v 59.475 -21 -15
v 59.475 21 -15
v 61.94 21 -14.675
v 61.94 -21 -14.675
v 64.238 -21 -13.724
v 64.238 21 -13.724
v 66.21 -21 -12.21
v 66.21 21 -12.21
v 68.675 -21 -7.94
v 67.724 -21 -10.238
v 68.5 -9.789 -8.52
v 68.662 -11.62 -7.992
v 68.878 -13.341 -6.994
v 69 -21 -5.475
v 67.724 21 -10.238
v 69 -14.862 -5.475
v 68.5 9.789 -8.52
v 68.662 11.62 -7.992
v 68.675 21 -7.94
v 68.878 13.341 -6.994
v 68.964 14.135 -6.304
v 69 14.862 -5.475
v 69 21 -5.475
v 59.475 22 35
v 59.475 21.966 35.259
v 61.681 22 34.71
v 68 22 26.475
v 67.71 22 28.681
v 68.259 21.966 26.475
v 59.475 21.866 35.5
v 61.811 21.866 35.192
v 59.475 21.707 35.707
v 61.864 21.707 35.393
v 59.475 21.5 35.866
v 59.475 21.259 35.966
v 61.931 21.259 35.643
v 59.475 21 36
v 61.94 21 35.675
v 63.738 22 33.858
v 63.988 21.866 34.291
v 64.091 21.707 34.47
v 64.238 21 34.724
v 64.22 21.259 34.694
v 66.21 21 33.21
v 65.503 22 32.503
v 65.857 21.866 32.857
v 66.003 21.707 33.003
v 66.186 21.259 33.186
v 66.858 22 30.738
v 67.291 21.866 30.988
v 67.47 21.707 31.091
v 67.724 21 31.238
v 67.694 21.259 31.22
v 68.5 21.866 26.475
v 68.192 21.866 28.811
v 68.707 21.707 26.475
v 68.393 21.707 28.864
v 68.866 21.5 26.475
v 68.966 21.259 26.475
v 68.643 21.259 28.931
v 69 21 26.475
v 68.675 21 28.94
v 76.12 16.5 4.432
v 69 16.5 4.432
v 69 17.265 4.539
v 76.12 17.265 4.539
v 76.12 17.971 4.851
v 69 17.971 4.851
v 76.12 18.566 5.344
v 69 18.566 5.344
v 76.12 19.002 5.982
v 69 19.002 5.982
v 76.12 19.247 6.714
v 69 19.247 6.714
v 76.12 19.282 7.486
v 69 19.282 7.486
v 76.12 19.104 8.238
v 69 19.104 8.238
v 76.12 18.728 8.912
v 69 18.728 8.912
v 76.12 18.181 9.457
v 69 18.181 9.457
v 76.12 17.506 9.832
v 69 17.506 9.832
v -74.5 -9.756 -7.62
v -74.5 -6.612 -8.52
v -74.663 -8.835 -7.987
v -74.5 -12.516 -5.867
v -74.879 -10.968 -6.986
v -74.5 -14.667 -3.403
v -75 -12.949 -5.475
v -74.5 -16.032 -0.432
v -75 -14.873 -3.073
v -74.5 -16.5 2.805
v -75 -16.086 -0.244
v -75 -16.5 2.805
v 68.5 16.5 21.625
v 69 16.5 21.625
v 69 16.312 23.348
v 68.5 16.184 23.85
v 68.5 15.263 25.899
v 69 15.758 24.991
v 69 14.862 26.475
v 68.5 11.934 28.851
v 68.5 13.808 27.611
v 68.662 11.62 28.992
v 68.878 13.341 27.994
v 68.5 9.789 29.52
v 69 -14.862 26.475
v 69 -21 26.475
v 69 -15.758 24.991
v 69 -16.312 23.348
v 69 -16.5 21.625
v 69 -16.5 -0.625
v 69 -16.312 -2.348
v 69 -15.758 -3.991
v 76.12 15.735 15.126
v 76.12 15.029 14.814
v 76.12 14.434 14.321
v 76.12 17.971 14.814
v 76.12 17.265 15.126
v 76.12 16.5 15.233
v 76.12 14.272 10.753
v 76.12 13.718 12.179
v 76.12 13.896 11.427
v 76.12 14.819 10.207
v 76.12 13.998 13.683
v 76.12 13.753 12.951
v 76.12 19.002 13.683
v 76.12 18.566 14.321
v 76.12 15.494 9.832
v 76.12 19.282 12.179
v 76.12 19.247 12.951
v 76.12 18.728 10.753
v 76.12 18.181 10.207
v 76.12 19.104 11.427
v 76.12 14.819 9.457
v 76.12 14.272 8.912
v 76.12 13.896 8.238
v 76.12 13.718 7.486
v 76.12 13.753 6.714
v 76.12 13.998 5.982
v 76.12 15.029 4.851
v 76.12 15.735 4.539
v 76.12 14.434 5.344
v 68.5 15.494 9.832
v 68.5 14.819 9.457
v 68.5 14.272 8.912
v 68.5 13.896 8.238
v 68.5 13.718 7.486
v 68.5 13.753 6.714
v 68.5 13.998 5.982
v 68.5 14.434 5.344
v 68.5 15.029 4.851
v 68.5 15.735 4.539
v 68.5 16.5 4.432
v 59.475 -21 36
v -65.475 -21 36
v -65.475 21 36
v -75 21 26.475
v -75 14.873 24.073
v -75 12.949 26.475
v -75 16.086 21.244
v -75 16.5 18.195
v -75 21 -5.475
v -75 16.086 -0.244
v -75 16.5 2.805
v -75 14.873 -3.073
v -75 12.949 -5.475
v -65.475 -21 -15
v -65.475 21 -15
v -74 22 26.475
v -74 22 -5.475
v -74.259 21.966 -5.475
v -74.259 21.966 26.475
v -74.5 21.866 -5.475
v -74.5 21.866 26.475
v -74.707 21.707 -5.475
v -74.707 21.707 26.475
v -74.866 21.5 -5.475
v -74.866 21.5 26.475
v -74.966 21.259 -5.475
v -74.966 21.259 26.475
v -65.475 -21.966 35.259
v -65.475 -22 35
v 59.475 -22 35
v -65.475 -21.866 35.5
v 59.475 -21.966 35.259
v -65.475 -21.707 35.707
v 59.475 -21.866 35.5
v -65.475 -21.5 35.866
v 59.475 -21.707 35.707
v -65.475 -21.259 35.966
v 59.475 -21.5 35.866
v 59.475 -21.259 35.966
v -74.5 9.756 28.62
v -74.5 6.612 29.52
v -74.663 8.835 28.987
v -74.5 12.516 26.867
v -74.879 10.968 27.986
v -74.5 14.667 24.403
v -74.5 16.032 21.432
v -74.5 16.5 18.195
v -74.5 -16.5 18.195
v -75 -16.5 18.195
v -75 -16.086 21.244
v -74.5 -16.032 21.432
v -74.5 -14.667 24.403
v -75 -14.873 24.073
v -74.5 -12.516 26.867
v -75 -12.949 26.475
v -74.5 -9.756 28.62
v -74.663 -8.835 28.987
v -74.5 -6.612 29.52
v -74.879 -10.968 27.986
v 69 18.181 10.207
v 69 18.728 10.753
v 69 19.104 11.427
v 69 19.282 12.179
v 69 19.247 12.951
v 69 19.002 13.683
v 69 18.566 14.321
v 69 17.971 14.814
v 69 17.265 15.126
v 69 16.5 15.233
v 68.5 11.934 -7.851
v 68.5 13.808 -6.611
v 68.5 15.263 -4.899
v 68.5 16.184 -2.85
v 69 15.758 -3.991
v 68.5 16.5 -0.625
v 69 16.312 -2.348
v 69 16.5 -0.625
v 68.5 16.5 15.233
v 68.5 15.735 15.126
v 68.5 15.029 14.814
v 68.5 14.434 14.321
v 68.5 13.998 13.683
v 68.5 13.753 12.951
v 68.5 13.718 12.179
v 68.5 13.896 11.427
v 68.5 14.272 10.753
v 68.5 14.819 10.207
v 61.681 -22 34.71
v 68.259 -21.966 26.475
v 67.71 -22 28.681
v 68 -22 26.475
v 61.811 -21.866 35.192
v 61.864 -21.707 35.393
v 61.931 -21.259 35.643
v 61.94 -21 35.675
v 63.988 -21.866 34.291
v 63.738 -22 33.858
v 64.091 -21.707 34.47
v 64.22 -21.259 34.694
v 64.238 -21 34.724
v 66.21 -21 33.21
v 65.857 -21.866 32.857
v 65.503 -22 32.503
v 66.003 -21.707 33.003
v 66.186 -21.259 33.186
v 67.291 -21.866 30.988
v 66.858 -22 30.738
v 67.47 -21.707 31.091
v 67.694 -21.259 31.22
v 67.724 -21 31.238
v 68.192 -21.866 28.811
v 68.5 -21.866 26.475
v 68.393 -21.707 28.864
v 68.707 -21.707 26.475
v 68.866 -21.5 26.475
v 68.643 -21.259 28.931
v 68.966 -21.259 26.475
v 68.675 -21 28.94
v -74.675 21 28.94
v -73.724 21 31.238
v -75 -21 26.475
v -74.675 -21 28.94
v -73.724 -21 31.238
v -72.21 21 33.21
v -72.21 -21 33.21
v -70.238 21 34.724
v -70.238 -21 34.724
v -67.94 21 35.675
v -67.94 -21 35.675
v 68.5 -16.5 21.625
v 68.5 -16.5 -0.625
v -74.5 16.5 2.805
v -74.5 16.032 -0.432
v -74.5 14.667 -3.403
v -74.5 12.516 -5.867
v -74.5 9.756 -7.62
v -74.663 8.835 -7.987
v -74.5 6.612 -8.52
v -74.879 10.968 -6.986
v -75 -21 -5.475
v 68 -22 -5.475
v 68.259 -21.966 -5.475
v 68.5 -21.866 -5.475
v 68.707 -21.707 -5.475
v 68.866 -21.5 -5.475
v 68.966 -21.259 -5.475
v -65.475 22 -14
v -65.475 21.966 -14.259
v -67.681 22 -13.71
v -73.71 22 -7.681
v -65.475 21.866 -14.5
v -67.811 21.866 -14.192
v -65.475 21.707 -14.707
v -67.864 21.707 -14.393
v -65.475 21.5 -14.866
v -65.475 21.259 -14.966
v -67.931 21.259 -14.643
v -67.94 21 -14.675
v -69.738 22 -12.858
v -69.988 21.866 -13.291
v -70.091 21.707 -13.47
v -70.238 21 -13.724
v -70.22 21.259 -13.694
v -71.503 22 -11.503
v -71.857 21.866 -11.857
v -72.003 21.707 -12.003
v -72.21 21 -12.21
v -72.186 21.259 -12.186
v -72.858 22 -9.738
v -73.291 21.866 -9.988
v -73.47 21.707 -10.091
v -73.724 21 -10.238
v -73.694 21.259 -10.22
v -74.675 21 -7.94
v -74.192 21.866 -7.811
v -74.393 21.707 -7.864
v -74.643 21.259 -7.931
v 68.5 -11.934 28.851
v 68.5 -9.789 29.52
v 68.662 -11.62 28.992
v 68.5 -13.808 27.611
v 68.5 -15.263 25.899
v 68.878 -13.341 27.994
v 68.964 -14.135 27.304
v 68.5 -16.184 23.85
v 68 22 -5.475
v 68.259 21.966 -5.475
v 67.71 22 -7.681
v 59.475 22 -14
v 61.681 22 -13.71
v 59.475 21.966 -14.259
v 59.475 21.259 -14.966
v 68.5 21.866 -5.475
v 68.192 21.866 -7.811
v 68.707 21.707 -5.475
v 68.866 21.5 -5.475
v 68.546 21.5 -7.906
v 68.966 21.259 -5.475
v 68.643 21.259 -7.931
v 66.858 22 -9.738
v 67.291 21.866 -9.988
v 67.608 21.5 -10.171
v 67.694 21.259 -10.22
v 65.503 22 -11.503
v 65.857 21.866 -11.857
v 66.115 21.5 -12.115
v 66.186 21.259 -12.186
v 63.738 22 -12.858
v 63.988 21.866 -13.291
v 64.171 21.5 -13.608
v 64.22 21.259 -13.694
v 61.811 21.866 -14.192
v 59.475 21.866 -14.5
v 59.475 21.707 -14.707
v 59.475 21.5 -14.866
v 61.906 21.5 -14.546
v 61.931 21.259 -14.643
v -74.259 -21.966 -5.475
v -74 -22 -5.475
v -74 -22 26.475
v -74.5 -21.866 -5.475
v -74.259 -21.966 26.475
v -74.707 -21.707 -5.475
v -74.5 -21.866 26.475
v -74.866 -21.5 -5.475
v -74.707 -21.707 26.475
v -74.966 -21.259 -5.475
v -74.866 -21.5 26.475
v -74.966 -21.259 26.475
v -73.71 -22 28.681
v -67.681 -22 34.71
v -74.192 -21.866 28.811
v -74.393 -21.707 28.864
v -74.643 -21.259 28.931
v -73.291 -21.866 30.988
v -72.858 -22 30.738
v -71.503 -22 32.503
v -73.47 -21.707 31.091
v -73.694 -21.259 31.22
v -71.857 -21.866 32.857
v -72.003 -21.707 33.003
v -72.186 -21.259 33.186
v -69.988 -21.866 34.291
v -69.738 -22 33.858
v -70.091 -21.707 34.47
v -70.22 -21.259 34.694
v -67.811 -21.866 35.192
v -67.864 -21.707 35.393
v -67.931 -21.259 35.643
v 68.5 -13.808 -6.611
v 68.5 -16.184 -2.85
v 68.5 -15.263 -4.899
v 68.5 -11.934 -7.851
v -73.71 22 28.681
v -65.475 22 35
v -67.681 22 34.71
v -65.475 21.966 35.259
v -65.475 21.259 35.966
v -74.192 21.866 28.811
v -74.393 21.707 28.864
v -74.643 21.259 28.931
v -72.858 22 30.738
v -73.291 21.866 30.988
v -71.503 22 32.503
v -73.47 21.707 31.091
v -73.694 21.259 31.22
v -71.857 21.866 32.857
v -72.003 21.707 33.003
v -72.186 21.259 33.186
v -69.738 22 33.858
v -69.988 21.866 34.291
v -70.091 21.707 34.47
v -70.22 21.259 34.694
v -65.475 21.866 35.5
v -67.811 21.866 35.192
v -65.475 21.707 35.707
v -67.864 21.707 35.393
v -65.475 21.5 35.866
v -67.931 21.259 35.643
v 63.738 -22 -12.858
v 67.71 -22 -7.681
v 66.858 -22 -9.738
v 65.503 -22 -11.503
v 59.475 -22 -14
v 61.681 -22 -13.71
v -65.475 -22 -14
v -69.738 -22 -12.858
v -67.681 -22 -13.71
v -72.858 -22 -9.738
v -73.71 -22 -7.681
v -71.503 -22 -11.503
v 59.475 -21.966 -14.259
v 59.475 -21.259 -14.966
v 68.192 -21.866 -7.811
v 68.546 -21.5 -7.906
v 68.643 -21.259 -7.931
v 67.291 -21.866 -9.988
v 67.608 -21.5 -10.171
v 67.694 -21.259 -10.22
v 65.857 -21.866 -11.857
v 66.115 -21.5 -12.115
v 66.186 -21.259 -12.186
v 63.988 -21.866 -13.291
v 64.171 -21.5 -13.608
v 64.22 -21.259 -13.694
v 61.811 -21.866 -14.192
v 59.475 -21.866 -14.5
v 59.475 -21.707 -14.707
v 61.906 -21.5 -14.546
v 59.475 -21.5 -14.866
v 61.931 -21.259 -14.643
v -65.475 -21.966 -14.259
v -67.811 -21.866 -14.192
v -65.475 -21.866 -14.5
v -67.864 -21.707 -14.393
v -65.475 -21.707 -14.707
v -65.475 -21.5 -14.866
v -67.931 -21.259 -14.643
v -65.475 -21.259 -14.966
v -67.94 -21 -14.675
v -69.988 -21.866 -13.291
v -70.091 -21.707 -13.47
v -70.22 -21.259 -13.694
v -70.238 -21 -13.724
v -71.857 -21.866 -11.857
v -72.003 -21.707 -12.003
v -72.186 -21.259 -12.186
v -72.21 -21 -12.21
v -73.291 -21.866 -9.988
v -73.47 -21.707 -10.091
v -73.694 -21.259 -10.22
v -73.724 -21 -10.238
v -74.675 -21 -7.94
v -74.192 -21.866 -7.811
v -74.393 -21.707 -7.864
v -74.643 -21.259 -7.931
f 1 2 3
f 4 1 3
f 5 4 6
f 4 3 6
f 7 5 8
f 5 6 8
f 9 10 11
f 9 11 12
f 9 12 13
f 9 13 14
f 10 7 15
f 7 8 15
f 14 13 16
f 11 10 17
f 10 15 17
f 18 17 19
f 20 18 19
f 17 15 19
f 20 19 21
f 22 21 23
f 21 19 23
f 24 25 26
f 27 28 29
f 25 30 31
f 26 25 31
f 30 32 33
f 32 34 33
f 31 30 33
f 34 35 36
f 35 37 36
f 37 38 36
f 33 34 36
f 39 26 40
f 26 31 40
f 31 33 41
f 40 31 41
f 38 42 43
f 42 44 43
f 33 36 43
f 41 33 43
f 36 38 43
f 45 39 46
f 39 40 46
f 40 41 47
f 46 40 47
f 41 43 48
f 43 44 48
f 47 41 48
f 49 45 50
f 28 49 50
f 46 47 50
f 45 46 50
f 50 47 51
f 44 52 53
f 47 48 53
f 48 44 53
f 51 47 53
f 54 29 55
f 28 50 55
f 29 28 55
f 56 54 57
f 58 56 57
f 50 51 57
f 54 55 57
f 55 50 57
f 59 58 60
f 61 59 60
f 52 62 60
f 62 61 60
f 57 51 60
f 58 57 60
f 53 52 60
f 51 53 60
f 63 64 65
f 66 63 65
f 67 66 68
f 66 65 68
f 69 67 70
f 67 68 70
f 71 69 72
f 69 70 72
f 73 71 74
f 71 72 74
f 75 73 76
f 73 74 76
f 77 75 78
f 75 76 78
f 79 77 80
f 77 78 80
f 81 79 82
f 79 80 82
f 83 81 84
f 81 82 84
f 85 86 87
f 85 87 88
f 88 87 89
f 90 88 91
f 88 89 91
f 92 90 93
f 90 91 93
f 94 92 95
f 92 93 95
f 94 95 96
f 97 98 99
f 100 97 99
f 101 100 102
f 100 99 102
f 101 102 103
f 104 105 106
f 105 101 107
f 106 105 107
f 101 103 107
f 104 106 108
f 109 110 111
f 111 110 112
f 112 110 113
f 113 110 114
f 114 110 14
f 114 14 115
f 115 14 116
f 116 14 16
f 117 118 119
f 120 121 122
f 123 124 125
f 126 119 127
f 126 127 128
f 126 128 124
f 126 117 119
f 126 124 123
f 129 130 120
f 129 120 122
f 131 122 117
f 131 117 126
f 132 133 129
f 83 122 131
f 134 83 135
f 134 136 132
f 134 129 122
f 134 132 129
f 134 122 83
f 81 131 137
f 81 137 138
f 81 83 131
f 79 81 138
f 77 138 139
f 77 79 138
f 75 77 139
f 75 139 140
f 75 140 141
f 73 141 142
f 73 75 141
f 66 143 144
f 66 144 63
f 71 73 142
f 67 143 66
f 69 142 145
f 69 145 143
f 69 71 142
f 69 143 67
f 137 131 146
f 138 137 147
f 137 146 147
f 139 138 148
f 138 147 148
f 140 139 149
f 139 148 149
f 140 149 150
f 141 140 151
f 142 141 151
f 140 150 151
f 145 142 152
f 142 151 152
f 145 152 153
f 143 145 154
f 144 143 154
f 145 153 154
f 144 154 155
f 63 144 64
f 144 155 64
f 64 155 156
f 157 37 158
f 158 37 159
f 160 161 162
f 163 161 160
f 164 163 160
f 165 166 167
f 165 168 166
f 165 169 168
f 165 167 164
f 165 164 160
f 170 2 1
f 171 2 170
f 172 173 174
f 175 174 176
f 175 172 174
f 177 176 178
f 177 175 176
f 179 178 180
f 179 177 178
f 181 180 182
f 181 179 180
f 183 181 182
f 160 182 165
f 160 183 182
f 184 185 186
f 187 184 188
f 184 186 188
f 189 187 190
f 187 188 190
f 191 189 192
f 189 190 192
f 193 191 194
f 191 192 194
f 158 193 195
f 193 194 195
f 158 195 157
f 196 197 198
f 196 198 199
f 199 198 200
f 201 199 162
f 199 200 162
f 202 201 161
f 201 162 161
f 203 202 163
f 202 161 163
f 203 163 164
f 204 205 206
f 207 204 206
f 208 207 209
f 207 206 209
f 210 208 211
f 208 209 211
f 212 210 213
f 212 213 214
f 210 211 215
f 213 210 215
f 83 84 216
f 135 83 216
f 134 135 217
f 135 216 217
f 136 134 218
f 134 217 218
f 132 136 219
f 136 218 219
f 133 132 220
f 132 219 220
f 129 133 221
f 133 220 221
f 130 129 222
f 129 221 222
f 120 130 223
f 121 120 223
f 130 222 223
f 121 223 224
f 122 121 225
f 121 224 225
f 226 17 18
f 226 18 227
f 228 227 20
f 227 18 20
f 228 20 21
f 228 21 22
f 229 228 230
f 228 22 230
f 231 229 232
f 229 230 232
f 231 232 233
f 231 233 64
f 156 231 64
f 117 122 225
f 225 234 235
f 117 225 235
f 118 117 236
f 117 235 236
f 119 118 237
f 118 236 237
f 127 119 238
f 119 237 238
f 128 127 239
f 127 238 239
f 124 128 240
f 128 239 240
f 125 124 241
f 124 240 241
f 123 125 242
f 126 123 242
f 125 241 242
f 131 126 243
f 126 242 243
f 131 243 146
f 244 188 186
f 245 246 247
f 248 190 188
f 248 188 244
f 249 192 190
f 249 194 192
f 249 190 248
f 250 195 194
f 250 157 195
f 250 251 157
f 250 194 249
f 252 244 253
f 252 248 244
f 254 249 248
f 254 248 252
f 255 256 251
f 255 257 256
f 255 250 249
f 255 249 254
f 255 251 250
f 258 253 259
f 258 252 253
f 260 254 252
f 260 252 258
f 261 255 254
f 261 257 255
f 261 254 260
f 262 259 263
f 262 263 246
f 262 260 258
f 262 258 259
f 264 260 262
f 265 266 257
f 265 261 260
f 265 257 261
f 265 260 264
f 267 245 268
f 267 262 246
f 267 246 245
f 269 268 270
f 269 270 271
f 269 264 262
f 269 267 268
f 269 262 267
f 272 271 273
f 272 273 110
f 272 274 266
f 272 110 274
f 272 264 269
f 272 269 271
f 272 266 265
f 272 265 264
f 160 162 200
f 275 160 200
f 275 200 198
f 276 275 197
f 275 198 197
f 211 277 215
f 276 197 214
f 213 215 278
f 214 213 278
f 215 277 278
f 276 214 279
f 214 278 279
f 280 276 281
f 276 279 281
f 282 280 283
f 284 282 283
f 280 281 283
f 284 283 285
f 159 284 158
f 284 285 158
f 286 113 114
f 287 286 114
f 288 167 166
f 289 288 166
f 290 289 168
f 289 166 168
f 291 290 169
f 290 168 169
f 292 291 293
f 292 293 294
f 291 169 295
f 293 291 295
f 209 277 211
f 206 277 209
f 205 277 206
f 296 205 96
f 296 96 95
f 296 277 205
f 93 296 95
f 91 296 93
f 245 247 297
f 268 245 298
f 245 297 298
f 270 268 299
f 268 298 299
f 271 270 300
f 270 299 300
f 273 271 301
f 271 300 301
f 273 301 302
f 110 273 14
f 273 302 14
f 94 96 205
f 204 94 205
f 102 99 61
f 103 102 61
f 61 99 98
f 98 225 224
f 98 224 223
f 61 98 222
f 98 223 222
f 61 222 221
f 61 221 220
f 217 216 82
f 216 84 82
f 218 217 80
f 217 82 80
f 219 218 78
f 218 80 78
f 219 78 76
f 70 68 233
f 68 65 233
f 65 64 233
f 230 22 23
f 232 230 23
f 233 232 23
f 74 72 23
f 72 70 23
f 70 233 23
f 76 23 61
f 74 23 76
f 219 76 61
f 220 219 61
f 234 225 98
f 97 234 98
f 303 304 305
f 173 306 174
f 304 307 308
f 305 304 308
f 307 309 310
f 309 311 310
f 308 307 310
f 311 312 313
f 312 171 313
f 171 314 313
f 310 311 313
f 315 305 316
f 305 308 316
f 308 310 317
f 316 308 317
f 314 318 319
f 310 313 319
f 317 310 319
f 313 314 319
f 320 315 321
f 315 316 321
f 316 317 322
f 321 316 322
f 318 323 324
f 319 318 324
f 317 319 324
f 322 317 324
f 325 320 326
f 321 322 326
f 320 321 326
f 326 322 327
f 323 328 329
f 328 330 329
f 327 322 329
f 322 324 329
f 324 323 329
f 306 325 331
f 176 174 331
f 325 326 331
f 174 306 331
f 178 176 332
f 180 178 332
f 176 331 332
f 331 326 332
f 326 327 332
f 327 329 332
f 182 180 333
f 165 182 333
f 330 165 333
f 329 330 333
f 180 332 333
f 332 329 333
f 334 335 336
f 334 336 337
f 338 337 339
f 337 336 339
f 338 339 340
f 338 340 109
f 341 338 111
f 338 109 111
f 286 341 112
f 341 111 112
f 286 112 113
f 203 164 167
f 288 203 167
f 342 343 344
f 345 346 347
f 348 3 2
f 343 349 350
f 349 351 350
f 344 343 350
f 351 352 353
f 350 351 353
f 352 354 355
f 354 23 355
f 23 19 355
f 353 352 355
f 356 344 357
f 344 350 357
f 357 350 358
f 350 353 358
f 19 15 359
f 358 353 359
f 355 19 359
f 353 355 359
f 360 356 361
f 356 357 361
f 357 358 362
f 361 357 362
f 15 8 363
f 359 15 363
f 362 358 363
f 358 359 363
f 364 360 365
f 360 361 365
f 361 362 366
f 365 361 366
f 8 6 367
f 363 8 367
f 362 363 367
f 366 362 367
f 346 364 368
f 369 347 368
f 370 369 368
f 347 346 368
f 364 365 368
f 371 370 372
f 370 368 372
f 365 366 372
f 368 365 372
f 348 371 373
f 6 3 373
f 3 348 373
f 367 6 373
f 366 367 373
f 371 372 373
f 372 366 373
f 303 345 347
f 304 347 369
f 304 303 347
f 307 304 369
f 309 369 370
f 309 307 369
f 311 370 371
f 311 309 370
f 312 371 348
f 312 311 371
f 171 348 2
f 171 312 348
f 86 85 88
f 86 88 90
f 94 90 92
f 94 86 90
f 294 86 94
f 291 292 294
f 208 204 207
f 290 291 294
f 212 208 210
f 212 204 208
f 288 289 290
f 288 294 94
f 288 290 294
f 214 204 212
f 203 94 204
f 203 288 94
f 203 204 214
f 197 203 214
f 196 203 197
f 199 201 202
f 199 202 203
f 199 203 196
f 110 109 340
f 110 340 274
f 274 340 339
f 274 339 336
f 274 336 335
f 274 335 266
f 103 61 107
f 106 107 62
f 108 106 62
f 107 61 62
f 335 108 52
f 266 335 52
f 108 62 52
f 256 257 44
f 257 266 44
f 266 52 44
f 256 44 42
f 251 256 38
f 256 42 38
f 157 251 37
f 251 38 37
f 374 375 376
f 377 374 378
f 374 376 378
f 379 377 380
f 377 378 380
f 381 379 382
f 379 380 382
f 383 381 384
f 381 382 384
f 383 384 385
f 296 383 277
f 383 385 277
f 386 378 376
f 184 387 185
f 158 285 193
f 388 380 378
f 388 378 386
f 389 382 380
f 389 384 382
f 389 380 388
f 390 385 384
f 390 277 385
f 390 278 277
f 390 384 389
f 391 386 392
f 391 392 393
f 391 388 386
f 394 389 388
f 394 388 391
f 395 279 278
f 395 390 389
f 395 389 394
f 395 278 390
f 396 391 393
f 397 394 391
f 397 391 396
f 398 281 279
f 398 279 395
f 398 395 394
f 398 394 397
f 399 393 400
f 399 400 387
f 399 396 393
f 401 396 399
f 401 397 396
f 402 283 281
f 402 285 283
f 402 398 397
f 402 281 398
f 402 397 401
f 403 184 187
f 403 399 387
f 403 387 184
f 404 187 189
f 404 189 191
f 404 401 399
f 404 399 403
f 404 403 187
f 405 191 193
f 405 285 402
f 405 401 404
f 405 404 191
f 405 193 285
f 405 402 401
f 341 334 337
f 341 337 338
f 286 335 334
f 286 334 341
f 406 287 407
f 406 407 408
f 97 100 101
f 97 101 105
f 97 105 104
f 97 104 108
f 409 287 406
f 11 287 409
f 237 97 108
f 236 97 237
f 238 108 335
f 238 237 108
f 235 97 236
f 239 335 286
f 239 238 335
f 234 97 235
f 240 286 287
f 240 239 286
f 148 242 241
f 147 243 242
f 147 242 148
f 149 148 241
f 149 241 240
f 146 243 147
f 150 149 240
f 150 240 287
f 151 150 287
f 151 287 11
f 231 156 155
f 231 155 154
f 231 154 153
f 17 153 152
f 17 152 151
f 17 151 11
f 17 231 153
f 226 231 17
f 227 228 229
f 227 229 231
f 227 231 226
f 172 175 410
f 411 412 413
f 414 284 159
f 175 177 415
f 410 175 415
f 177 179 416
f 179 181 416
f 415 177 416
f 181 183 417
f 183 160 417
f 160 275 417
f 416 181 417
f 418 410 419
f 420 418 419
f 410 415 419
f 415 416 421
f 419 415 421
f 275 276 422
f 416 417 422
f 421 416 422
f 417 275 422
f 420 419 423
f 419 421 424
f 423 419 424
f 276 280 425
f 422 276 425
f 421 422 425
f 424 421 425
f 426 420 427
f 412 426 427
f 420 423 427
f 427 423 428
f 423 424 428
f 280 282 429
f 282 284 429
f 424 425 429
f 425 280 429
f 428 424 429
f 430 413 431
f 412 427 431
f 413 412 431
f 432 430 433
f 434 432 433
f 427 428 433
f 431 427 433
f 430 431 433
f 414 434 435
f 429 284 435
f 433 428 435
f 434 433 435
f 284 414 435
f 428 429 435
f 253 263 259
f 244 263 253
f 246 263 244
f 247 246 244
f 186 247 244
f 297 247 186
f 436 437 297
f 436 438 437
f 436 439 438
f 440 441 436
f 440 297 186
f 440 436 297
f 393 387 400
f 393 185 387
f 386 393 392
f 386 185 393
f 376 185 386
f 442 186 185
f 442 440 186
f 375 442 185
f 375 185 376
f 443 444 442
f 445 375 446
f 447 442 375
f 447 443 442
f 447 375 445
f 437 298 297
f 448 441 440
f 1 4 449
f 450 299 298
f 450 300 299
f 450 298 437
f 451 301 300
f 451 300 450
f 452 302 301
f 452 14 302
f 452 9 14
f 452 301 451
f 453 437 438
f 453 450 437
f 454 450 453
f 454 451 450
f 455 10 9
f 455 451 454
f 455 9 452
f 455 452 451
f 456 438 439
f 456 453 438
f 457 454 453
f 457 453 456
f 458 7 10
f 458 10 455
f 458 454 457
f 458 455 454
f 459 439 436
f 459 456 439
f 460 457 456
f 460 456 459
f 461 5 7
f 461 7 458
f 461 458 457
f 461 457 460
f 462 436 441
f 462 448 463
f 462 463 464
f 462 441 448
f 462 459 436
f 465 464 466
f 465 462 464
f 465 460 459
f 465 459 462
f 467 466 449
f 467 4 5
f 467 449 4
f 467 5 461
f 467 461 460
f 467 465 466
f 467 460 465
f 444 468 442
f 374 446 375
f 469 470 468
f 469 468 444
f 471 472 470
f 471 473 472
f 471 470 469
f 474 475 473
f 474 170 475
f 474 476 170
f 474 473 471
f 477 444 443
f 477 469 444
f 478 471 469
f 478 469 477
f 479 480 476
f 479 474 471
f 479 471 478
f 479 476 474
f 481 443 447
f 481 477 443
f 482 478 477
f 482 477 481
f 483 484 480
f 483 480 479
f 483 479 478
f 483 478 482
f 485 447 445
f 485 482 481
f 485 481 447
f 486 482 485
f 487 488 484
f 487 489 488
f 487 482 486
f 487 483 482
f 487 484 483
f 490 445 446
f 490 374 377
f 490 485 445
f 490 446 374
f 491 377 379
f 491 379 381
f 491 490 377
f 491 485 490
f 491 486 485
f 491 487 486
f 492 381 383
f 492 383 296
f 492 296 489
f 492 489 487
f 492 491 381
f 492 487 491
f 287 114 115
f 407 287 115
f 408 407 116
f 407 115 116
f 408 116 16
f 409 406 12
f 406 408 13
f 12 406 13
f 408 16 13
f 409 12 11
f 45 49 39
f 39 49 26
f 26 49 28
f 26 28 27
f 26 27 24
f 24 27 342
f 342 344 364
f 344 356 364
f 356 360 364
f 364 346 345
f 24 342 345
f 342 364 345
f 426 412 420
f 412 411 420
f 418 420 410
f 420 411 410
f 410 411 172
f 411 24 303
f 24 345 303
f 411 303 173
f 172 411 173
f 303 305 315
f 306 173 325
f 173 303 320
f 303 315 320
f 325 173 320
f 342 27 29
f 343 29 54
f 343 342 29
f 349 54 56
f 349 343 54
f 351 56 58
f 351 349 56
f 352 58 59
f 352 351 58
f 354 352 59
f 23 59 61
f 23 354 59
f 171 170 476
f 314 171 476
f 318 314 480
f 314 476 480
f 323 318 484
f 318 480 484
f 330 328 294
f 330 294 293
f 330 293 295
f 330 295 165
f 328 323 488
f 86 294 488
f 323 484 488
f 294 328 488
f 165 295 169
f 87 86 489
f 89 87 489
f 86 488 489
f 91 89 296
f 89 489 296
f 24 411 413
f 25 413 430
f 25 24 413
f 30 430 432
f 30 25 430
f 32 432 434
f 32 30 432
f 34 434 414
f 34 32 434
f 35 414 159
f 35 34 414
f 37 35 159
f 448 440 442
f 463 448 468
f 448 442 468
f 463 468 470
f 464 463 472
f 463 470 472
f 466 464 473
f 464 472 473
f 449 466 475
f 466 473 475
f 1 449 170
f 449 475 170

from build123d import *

# Parameters (mm, degrees)
SKETCH1_W                = 144
SKETCH1_H                = 44
BOSS_EXTRUDE1_DEPTH      = 51
CUT_EXTRUDE1_DEPTH       = 0.5
CUT_EXTRUDE2_DEPTH       = 0.5
FILLET1_R                = 9.525
FILLET2_R                = 1
BOSS_EXTRUDE2_DEPTH      = 7.62
BOSS_EXTRUDE2_DEPTH_BACK = 2.54


with BuildPart() as part:
    # Sketch1 → Boss-Extrude1 (new body)
    with BuildSketch(Plane(origin=(0, 0, -15), x_dir=(-1, 0, 0), z_dir=(0, 0, -1))):
        with Locations((3, 0)):
            Rectangle(SKETCH1_W, SKETCH1_H)
    extrude(amount=-BOSS_EXTRUDE1_DEPTH)

    # Sketch2 → Cut-Extrude1 (cut)
    with BuildSketch(Plane(origin=(69, 0, 0), x_dir=(0, 0, -1), z_dir=(1, 0, 0))):
        with BuildLine():
            Line((-29.625, 8.5), (-29.625, -8.5))
            ThreePointArc((-29.625, -8.5), (-27.281854249, -14.156854249), (-21.625, -16.5))
            Line((-21.625, -16.5), (0.625, -16.5))
            ThreePointArc((0.625, -16.5), (6.281854249, -14.156854249), (8.625, -8.5))
            Line((8.625, -8.5), (8.625, 8.5))
            ThreePointArc((8.625, 8.5), (6.281854249, 14.156854249), (0.625, 16.5))
            Line((0.625, 16.5), (-21.625, 16.5))
            ThreePointArc((-21.625, 16.5), (-27.281854249, 14.156854249), (-29.625, 8.5))
        make_face()
    extrude(amount=-CUT_EXTRUDE1_DEPTH, mode=Mode.SUBTRACT)

    # Sketch3 → Cut-Extrude2 (cut)
    with BuildSketch(Plane.ZY.offset(75)):
        with BuildLine():
            Line((18.195, 16.5), (2.805, 16.5))
            ThreePointArc((2.805, 16.5), (-5.277230509, 13.152230509), (-8.625, 5.07))
            Line((-8.625, 5.07), (-8.625, -5.07))
            ThreePointArc((-8.625, -5.07), (-5.277230509, -13.152230509), (2.805, -16.5))
            Line((2.805, -16.5), (18.195, -16.5))
            ThreePointArc((18.195, -16.5), (26.277230509, -13.152230509), (29.625, -5.07))
            Line((29.625, -5.07), (29.625, 5.07))
            ThreePointArc((29.625, 5.07), (26.277230509, 13.152230509), (18.195, 16.5))
        make_face()
    extrude(amount=-CUT_EXTRUDE2_DEPTH, mode=Mode.SUBTRACT)

    # Fillet1
    # the kernel refuses this fillet: 9.525 mm, written as the material it takes off along each edge
    with BuildSketch(Plane(origin=(-75, -45.8125, -15), x_dir=(0, 0, 1), z_dir=(0, 1, 0)), Plane(origin=(69, 45.8125, -15), x_dir=(0, 0, 1), z_dir=(0, -1, 0))) as fillet1_piece_1:
        with BuildLine():
            CenterArc((FILLET1_R, FILLET1_R), FILLET1_R, 180, 90)
            Line((0, FILLET1_R), (0, 0))
            Line((0, 0), (FILLET1_R, 0))
        make_face()
    extrude(amount=91.625, mode=Mode.SUBTRACT)
    with BuildSketch(Plane(origin=(-75, -45.8125, 36), x_dir=(0, 0, -1), z_dir=(0, 1, 0)), Plane(origin=(69, 45.8125, 36), x_dir=(0, 0, -1), z_dir=(0, -1, 0))) as fillet1_piece_2:
        with BuildLine():
            CenterArc((FILLET1_R, -FILLET1_R), FILLET1_R, 90, 90)
            Line((0, -FILLET1_R), (0, 0))
            Line((0, 0), (FILLET1_R, 0))
        make_face()
    extrude(amount=91.625, mode=Mode.SUBTRACT)

    # Fillet2
    fillet2_edges = [part.edges().sort_by_distance(p)[0] for p in [
        (-3, -22, -15),
        (-3, 22, -15),
        (-75, 22, 10.5),
        (-3, 22, 36),
        (69, 22, 10.5),
        (66.210192091, 22, 33.210192091),
        (66.210192091, 22, -12.210192091),
        (-72.210192091, 22, 33.210192091),
        (-72.210192091, 22, -12.210192091),
        (-75, -22, 10.5),
        (69, -22, 10.5),
        (-3, -22, 36),
        (66.210192091, -22, 33.210192091),
        (66.210192091, -22, -12.210192091),
        (-72.210192091, -22, 33.210192091),
        (-72.210192091, -22, -12.210192091),
    ]]
    fillet(fillet2_edges, radius=FILLET2_R)

    # Sketch5 → Boss-Extrude2 (add, two sides: drawn at the far end of the back side and taken through both)
    with BuildSketch(Plane(origin=(68.5, 0, 0), x_dir=(0, 0, -1), z_dir=(1, 0, 0)).offset(-BOSS_EXTRUDE2_DEPTH_BACK)):
        with BuildLine():
            Line((-10.019743612, 16.5), (-9.645122715, 16.5))
            ThreePointArc((-9.645122715, 16.5), (-9.692349462, 17.011539536), (-9.832433164, 17.505786052))
            ThreePointArc((-9.832433164, 17.505786052), (-9.972516865, 17.011539536), (-10.019743612, 16.5))
        make_face()
        with BuildLine():
            Line((-4.431743612, 16.5), (-9.645122715, 16.5))
            ThreePointArc((-9.645122715, 16.5), (-9.692349462, 15.988460464), (-9.832433164, 15.494213948))
            ThreePointArc((-9.832433164, 15.494213948), (-6.714204076, 13.753226747), (-4.431743612, 16.5))
        make_face()
        with BuildLine():
            ThreePointArc((-9.832433164, 17.505786052), (-9.692349462, 17.011539536), (-9.645122715, 16.5))
            Line((-9.645122715, 16.5), (-4.431743612, 16.5))
            ThreePointArc((-4.431743612, 16.5), (-6.714204076, 19.246773253), (-9.832433164, 17.505786052))
        make_face()
        with BuildLine():
            ThreePointArc((-9.832433164, 15.494213948), (-9.692349462, 15.988460464), (-9.645122715, 16.5))
            Line((-9.645122715, 16.5), (-10.019743612, 16.5))
            ThreePointArc((-10.019743612, 16.5), (-9.972516865, 15.988460464), (-9.832433164, 15.494213948))
        make_face()
        with BuildLine():
            ThreePointArc((-10.019743612, 16.5), (-9.972516865, 17.011539536), (-9.832433164, 17.505786052))
            ThreePointArc((-9.832433164, 17.505786052), (-12.950662251, 19.246773253), (-15.233122715, 16.5))
            Line((-15.233122715, 16.5), (-10.019743612, 16.5))
        make_face()
        with BuildLine():
            ThreePointArc((-15.233122715, 16.5), (-12.950662251, 13.753226747), (-9.832433164, 15.494213948))
            ThreePointArc((-9.832433164, 15.494213948), (-9.972516865, 15.988460464), (-10.019743612, 16.5))
            Line((-10.019743612, 16.5), (-15.233122715, 16.5))
        make_face()
    extrude(amount=BOSS_EXTRUDE2_DEPTH + BOSS_EXTRUDE2_DEPTH_BACK)


solid = part.part
